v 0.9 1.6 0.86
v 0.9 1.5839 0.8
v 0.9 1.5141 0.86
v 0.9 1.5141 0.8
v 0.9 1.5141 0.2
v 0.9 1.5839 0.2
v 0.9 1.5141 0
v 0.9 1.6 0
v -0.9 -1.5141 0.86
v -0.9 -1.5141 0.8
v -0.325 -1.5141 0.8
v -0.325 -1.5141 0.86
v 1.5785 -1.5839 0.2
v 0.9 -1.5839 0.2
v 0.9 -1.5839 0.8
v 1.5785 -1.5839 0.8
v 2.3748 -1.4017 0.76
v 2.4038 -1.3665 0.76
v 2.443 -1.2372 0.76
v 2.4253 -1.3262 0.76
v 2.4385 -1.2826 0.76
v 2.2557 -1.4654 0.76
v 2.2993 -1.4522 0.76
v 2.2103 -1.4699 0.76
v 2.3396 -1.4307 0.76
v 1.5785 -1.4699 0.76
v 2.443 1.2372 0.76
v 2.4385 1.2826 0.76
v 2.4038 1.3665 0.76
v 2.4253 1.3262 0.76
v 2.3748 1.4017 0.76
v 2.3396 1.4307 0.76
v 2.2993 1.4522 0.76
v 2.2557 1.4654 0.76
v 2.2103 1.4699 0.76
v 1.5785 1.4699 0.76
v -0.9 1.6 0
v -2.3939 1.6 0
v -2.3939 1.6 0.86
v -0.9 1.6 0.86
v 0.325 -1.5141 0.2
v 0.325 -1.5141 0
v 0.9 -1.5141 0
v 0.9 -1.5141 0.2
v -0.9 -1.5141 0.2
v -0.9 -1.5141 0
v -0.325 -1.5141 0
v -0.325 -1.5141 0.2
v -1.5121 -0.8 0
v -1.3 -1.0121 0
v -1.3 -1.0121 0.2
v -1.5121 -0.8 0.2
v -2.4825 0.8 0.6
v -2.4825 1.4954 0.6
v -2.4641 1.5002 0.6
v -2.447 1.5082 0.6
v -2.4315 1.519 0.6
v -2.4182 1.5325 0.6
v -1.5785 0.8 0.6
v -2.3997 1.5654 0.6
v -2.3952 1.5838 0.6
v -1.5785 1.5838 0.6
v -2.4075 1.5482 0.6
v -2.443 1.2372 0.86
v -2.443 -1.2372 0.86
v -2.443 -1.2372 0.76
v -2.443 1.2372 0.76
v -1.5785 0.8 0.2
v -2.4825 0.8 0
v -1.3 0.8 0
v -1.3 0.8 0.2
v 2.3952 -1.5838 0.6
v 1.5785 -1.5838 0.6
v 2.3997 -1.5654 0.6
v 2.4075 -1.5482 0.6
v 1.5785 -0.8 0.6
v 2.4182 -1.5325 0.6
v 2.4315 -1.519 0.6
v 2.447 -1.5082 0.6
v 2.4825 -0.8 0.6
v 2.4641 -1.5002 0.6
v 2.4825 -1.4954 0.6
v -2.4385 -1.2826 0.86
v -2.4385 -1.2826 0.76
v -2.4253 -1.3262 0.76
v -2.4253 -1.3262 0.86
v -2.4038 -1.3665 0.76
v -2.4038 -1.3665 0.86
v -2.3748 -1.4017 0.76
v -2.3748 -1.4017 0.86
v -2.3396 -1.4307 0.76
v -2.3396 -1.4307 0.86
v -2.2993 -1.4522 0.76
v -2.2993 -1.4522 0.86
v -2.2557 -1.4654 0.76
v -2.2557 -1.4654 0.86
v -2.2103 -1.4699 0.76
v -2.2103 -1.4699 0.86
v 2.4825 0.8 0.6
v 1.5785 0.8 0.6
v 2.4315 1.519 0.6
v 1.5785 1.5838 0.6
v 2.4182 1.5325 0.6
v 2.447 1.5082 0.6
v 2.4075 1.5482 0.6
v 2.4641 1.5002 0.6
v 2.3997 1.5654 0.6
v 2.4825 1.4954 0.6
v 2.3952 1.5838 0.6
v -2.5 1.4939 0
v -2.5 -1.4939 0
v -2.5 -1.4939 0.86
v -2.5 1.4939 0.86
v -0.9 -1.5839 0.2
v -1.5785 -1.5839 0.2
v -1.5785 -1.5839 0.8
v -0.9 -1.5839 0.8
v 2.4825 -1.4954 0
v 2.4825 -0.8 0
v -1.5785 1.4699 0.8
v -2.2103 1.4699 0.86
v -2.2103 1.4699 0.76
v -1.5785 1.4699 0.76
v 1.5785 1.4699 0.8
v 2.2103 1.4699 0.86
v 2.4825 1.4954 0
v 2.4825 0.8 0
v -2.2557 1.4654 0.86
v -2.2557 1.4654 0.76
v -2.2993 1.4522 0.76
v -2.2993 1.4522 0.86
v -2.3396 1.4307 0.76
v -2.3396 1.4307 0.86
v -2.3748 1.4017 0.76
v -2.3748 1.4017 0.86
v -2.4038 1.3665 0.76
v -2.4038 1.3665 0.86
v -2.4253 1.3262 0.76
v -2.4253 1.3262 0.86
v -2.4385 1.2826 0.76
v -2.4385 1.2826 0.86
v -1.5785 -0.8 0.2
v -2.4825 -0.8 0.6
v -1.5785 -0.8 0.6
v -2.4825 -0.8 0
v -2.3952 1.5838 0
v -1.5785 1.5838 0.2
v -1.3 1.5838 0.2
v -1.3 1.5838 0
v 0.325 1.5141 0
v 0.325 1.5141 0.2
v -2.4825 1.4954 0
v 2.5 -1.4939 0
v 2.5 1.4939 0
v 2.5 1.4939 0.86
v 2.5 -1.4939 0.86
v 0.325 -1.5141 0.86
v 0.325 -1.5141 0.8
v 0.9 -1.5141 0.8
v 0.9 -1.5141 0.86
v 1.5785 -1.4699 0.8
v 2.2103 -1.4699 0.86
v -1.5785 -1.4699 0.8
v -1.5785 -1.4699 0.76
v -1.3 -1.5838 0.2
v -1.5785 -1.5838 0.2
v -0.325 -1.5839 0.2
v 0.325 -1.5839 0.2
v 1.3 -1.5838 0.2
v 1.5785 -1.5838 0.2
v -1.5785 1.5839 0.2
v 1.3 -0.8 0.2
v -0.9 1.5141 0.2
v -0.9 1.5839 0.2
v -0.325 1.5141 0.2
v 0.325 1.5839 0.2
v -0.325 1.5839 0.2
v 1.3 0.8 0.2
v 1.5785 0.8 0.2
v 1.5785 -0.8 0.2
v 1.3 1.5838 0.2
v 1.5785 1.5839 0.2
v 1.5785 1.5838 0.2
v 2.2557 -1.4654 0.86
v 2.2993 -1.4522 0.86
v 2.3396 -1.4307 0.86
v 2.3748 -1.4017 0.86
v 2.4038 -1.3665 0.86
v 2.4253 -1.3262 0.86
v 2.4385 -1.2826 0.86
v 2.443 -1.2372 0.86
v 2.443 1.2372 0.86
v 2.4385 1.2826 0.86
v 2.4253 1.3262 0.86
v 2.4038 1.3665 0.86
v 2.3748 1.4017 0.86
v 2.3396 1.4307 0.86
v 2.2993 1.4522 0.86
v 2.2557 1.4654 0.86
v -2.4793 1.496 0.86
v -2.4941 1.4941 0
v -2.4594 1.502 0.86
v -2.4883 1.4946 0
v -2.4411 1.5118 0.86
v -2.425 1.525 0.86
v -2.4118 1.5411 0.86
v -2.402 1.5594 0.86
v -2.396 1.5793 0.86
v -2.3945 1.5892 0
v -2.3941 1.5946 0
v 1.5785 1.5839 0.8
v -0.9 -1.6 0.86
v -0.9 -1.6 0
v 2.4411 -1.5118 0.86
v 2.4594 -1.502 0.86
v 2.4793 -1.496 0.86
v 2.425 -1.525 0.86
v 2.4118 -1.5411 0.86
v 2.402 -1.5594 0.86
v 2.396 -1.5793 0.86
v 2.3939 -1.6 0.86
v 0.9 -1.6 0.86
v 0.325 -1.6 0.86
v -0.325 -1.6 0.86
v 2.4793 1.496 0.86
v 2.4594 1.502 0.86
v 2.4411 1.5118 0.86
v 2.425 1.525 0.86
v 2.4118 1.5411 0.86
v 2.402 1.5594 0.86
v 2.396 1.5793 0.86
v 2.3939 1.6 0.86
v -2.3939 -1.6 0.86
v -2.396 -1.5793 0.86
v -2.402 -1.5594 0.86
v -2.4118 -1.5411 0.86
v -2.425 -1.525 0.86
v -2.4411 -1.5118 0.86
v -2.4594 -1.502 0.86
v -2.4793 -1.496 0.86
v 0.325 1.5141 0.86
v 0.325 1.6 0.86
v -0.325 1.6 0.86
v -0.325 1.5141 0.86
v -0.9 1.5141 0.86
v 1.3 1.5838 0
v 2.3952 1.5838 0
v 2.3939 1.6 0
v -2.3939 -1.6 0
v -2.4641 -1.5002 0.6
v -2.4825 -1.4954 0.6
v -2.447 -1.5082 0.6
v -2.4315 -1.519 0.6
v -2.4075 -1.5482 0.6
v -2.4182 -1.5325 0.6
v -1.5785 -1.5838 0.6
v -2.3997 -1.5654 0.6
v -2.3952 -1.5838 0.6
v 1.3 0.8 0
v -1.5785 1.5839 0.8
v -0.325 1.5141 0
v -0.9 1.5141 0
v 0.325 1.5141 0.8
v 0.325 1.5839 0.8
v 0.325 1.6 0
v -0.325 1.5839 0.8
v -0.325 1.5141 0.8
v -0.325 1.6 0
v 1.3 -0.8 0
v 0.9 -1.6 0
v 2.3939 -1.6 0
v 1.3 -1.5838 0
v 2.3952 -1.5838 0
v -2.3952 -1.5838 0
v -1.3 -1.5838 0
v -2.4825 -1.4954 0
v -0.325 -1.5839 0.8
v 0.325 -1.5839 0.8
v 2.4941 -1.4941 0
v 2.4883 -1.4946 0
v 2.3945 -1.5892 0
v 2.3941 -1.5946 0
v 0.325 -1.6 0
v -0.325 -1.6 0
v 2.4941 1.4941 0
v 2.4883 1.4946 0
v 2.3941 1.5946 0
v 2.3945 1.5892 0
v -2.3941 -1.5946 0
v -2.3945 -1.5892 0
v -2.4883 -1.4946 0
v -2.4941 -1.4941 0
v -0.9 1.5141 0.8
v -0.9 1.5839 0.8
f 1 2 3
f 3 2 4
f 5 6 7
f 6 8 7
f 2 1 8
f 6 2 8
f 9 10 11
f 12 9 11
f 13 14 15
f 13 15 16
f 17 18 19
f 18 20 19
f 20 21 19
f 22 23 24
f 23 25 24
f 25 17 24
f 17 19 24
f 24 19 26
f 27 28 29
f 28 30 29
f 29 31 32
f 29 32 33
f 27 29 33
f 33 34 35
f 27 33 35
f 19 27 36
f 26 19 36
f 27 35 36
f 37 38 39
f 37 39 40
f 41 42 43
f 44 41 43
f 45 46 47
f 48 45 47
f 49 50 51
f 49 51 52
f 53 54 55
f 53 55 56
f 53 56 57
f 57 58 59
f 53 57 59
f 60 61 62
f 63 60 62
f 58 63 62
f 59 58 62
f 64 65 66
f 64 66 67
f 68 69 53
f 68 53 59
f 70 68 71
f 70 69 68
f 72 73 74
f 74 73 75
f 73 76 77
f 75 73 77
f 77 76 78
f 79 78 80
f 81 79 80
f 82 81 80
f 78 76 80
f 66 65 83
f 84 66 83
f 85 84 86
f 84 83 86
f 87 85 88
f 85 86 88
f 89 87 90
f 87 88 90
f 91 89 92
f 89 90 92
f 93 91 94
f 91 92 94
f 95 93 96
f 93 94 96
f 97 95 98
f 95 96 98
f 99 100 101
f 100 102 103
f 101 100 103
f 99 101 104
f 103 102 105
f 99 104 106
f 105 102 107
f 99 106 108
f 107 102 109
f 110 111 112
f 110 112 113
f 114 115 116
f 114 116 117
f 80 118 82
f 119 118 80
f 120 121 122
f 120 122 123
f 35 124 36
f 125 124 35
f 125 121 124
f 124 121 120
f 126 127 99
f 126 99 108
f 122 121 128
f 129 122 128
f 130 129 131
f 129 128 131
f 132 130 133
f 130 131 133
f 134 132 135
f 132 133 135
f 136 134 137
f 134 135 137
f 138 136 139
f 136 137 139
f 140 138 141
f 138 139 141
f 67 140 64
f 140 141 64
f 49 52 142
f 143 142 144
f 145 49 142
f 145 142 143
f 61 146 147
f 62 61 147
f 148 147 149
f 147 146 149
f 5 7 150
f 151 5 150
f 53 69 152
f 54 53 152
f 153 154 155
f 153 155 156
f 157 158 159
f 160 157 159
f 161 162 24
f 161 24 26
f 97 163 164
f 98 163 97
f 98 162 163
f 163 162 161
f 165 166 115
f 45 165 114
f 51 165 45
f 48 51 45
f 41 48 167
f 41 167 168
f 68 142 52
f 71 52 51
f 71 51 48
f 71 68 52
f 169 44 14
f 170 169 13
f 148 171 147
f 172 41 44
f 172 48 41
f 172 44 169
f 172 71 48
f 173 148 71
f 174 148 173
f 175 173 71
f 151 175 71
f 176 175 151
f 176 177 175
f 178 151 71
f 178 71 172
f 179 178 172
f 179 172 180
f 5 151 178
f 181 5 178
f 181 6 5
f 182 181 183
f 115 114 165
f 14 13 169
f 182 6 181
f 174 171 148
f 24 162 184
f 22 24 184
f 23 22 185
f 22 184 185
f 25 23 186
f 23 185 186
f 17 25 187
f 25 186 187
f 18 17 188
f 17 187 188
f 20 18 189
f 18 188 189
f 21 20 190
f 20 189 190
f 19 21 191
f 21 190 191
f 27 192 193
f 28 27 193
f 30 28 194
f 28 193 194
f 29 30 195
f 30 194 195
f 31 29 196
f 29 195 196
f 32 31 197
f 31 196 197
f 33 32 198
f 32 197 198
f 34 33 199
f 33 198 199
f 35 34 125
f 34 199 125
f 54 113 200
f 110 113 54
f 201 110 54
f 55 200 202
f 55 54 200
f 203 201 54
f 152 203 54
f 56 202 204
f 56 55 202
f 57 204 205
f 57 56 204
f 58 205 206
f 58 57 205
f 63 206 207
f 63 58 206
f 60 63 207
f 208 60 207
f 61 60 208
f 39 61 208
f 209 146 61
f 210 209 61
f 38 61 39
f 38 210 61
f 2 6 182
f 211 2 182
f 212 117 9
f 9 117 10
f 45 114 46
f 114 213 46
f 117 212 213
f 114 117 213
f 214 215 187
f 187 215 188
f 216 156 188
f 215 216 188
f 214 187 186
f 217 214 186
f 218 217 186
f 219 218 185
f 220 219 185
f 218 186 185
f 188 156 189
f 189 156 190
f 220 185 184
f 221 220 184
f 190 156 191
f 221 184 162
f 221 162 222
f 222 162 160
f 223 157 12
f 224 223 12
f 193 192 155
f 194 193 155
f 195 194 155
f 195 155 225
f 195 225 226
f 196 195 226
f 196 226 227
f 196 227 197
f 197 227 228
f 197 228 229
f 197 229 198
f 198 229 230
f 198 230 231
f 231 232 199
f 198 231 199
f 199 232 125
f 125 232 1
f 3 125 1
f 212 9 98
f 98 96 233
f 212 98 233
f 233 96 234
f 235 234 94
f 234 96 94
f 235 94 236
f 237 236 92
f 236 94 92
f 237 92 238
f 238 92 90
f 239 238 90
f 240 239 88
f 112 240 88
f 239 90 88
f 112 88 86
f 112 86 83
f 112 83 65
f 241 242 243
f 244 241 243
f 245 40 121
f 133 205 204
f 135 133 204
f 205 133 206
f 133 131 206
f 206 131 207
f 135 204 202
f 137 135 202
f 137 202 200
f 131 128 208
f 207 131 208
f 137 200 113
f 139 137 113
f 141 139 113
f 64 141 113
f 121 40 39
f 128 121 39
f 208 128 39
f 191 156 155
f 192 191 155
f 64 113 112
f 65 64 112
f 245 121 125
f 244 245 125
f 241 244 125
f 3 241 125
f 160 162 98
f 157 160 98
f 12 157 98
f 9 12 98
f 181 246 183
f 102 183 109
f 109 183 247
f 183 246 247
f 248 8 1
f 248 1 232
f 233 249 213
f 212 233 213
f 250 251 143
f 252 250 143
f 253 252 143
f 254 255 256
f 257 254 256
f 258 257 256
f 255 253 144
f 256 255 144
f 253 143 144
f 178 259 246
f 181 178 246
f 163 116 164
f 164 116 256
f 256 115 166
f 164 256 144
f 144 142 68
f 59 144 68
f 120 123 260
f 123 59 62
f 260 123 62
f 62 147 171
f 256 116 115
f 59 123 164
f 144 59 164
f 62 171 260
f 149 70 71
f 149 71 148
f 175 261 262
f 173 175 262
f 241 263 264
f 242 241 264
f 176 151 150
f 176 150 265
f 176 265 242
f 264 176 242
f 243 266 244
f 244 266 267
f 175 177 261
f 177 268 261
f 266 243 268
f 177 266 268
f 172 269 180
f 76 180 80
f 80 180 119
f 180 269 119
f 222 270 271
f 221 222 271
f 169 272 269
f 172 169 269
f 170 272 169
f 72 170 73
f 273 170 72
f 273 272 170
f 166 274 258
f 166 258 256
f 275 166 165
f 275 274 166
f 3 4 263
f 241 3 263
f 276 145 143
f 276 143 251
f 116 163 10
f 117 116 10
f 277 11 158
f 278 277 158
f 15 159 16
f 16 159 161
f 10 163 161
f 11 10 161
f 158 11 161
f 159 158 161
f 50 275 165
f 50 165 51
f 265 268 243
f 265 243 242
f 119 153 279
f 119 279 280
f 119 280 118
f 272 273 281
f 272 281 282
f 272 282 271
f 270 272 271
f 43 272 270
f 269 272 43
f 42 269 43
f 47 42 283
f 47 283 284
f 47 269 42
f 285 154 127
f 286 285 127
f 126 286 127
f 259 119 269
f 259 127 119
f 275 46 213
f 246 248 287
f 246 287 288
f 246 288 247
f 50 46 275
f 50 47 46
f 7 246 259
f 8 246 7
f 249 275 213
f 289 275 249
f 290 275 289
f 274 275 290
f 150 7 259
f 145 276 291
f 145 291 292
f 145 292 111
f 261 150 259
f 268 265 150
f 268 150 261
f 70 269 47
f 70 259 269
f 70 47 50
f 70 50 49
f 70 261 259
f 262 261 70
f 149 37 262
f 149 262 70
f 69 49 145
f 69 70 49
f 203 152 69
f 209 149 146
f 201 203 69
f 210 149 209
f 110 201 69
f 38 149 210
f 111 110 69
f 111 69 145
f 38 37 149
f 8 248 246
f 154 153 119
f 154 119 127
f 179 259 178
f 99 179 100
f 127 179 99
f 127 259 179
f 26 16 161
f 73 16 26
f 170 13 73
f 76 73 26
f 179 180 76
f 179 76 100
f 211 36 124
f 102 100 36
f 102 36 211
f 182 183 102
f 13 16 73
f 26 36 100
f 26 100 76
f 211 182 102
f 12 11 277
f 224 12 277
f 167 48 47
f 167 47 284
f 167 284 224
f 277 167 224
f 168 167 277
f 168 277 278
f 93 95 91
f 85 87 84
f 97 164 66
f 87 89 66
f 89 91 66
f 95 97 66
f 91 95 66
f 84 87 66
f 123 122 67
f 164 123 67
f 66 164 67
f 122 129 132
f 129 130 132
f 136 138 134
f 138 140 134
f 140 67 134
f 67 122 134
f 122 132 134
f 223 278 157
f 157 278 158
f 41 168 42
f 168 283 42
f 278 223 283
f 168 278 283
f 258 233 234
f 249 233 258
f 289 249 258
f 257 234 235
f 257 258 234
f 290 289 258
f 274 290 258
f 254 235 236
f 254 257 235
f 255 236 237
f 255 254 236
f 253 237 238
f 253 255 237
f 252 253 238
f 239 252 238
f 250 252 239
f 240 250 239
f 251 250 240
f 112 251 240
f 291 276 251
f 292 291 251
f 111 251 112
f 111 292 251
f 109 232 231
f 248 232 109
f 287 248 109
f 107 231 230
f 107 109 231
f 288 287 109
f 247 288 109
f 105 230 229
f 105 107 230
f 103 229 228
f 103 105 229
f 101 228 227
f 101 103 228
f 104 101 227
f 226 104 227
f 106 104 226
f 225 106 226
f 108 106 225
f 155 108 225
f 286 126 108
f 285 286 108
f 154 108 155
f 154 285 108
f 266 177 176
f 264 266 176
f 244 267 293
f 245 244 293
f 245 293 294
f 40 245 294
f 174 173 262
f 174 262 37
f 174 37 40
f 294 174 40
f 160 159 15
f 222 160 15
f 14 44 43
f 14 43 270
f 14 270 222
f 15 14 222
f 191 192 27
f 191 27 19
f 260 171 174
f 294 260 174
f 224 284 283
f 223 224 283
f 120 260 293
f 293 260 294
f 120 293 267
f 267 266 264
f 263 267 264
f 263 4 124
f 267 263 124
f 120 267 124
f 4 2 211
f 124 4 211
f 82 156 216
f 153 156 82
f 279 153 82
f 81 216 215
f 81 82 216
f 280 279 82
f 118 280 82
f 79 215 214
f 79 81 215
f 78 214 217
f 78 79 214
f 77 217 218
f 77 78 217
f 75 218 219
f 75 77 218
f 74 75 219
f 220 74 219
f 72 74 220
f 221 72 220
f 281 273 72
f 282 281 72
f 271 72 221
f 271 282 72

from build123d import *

# Parameters (mm, degrees)
PAD006_DEPTH = 0.1
PAD007_DEPTH = 0.2
FILLET_R     = 0.07
PAD_DEPTH    = 0.86
SKETCH005_W  = 3.157072
SKETCH005_H  = 3.167884
PAD004_DEPTH = 0.6
SKETCH004_W  = 1.182453
SKETCH004_H  = 0.783814
PAD005_DEPTH = 0.6


with BuildPart() as substrate:
    # Sketch006 → Pad006 (new body)
    with BuildSketch(Plane.XY):
        with BuildLine():
            Line((-2.210251, 1.469894), (2.210251, 1.469894))
            ThreePointArc((2.442988, 1.237157), (2.374821, 1.401727), (2.210251, 1.469894))
            Line((2.442988, 1.237157), (2.442988, -1.237157))
            ThreePointArc((2.210251, -1.469894), (2.374821, -1.401727), (2.442988, -1.237157))
            Line((2.210251, -1.469894), (-2.210251, -1.469894))
            ThreePointArc((-2.442988, -1.237157), (-2.374821, -1.401727), (-2.210251, -1.469894))
            Line((-2.442988, -1.237157), (-2.442988, 1.237157))
            ThreePointArc((-2.210251, 1.469894), (-2.374821, 1.401727), (-2.442988, 1.237157))
        make_face()
    extrude(amount=-PAD006_DEPTH)

    # Sketch007 → Pad007 (join)
    with BuildSketch(Plane.XY):
        with BuildLine():
            Line((-2.242494, 1.3481), (2.242494, 1.3481))
            ThreePointArc((2.32297, 1.267624), (2.299399, 1.324529), (2.242494, 1.3481))
            Line((2.32297, 1.267624), (2.32297, -1.267624))
            ThreePointArc((2.242494, -1.3481), (2.299399, -1.324529), (2.32297, -1.267624))
            Line((2.242494, -1.3481), (-2.242494, -1.3481))
            ThreePointArc((-2.32297, -1.267624), (-2.299399, -1.324529), (-2.242494, -1.3481))
            Line((-2.32297, -1.267624), (-2.32297, 1.267624))
            ThreePointArc((-2.242494, 1.3481), (-2.299399, 1.324529), (-2.32297, 1.267624))
        make_face()
    extrude(amount=PAD007_DEPTH)

    # Fillet
    fillet_edges = [substrate.edges().sort_by_distance(p)[0] for p in [
        (-2.299399, -1.324529, 0),
        (-2.32297, 0, 0),
        (0, -1.3481, 0),
        (2.299399, -1.324529, 0),
        (2.32297, 0, 0),
        (2.299399, 1.324529, 0),
        (0, 1.3481, 0),
        (-2.299399, 1.324529, 0),
    ]]
    fillet(fillet_edges, radius=FILLET_R)


with BuildPart() as substrate_1:
    # Body006 placement: moved
    add(substrate.part.moved(Location((0, 0, 0.86))))


with BuildPart() as epoxy_envelope:
    # Sketch → Pad (new body)
    with BuildSketch(Plane.XY):
        with BuildLine():
            ThreePointArc((-2.5, 1.493934), (-2.425, 1.525), (-2.393934, 1.6))
            Line((-2.393934, 1.6), (-0.9, 1.6))
            Line((-0.9, 1.514092), (-0.9, 1.6))
            Line((-0.325, 1.514092), (-0.9, 1.514092))
            Line((-0.325, 1.6), (-0.325, 1.514092))
            Line((-0.325, 1.6), (0.325, 1.6))
            Line((0.325, 1.514092), (0.325, 1.6))
            Line((0.9, 1.514092), (0.325, 1.514092))
            Line((0.9, 1.6), (0.9, 1.514092))
            Line((0.9, 1.6), (2.393934, 1.6))
            ThreePointArc((2.393934, 1.6), (2.425, 1.525), (2.5, 1.493934))
            Line((2.5, 1.493934), (2.5, -1.493934))
            ThreePointArc((2.5, -1.493934), (2.425, -1.525), (2.393934, -1.6))
            Line((0.9, -1.6), (2.393934, -1.6))
            Line((0.9, -1.514092), (0.9, -1.6))
            Line((0.325, -1.514092), (0.9, -1.514092))
            Line((0.325, -1.6), (0.325, -1.514092))
            Line((-0.325, -1.6), (0.325, -1.6))
            Line((-0.325, -1.514092), (-0.325, -1.6))
            Line((-0.9, -1.514092), (-0.325, -1.514092))
            Line((-0.9, -1.6), (-0.9, -1.514092))
            Line((-2.393934, -1.6), (-0.9, -1.6))
            ThreePointArc((-2.393934, -1.6), (-2.425, -1.525), (-2.5, -1.493934))
            Line((-2.5, -1.493934), (-2.5, 1.493934))
        make_face()
    extrude(amount=PAD_DEPTH)


with BuildPart() as epoxy_envelope_clone:
    # Body005 base: copy of Epoxy Envelope
    add(epoxy_envelope.part)


with BuildPart() as gold_bits_clone:
    # Sketch005 (on DatumPlane) → Pad004 (new body)
    with BuildSketch(Plane.XY.offset(0.2)):
        Rectangle(SKETCH005_W, SKETCH005_H)
    extrude(amount=PAD004_DEPTH)

    # Sketch004 → Pad005 (join)
    with BuildSketch(Plane.XY):
        Polygon((-2.482453, -1.583814), (-1.3, -1.583814), (-1.3, -1.012132), (-1.512132, -0.8), (-2.482453, -0.8), align=None)
        with Locations((-1.891227, 1.191907)):
            Rectangle(SKETCH004_W, SKETCH004_H)
        with Locations((1.891227, 1.191907)):
            Rectangle(SKETCH004_W, SKETCH004_H)
        with Locations((1.891227, -1.191907)):
            Rectangle(SKETCH004_W, SKETCH004_H)
    extrude(amount=PAD005_DEPTH)

    # Common: intersect Epoxy Envelope Clone
    add(epoxy_envelope_clone.part, mode=Mode.INTERSECT)

    # Fusion: union Substrate
    add(substrate_1.part)


with BuildPart() as epoxy:
    # Cut base: copy of Epoxy Envelope
    add(epoxy_envelope.part)

    # Cut: cut Gold Bits Clone
    add(gold_bits_clone.part, mode=Mode.SUBTRACT)


solid = epoxy.part
